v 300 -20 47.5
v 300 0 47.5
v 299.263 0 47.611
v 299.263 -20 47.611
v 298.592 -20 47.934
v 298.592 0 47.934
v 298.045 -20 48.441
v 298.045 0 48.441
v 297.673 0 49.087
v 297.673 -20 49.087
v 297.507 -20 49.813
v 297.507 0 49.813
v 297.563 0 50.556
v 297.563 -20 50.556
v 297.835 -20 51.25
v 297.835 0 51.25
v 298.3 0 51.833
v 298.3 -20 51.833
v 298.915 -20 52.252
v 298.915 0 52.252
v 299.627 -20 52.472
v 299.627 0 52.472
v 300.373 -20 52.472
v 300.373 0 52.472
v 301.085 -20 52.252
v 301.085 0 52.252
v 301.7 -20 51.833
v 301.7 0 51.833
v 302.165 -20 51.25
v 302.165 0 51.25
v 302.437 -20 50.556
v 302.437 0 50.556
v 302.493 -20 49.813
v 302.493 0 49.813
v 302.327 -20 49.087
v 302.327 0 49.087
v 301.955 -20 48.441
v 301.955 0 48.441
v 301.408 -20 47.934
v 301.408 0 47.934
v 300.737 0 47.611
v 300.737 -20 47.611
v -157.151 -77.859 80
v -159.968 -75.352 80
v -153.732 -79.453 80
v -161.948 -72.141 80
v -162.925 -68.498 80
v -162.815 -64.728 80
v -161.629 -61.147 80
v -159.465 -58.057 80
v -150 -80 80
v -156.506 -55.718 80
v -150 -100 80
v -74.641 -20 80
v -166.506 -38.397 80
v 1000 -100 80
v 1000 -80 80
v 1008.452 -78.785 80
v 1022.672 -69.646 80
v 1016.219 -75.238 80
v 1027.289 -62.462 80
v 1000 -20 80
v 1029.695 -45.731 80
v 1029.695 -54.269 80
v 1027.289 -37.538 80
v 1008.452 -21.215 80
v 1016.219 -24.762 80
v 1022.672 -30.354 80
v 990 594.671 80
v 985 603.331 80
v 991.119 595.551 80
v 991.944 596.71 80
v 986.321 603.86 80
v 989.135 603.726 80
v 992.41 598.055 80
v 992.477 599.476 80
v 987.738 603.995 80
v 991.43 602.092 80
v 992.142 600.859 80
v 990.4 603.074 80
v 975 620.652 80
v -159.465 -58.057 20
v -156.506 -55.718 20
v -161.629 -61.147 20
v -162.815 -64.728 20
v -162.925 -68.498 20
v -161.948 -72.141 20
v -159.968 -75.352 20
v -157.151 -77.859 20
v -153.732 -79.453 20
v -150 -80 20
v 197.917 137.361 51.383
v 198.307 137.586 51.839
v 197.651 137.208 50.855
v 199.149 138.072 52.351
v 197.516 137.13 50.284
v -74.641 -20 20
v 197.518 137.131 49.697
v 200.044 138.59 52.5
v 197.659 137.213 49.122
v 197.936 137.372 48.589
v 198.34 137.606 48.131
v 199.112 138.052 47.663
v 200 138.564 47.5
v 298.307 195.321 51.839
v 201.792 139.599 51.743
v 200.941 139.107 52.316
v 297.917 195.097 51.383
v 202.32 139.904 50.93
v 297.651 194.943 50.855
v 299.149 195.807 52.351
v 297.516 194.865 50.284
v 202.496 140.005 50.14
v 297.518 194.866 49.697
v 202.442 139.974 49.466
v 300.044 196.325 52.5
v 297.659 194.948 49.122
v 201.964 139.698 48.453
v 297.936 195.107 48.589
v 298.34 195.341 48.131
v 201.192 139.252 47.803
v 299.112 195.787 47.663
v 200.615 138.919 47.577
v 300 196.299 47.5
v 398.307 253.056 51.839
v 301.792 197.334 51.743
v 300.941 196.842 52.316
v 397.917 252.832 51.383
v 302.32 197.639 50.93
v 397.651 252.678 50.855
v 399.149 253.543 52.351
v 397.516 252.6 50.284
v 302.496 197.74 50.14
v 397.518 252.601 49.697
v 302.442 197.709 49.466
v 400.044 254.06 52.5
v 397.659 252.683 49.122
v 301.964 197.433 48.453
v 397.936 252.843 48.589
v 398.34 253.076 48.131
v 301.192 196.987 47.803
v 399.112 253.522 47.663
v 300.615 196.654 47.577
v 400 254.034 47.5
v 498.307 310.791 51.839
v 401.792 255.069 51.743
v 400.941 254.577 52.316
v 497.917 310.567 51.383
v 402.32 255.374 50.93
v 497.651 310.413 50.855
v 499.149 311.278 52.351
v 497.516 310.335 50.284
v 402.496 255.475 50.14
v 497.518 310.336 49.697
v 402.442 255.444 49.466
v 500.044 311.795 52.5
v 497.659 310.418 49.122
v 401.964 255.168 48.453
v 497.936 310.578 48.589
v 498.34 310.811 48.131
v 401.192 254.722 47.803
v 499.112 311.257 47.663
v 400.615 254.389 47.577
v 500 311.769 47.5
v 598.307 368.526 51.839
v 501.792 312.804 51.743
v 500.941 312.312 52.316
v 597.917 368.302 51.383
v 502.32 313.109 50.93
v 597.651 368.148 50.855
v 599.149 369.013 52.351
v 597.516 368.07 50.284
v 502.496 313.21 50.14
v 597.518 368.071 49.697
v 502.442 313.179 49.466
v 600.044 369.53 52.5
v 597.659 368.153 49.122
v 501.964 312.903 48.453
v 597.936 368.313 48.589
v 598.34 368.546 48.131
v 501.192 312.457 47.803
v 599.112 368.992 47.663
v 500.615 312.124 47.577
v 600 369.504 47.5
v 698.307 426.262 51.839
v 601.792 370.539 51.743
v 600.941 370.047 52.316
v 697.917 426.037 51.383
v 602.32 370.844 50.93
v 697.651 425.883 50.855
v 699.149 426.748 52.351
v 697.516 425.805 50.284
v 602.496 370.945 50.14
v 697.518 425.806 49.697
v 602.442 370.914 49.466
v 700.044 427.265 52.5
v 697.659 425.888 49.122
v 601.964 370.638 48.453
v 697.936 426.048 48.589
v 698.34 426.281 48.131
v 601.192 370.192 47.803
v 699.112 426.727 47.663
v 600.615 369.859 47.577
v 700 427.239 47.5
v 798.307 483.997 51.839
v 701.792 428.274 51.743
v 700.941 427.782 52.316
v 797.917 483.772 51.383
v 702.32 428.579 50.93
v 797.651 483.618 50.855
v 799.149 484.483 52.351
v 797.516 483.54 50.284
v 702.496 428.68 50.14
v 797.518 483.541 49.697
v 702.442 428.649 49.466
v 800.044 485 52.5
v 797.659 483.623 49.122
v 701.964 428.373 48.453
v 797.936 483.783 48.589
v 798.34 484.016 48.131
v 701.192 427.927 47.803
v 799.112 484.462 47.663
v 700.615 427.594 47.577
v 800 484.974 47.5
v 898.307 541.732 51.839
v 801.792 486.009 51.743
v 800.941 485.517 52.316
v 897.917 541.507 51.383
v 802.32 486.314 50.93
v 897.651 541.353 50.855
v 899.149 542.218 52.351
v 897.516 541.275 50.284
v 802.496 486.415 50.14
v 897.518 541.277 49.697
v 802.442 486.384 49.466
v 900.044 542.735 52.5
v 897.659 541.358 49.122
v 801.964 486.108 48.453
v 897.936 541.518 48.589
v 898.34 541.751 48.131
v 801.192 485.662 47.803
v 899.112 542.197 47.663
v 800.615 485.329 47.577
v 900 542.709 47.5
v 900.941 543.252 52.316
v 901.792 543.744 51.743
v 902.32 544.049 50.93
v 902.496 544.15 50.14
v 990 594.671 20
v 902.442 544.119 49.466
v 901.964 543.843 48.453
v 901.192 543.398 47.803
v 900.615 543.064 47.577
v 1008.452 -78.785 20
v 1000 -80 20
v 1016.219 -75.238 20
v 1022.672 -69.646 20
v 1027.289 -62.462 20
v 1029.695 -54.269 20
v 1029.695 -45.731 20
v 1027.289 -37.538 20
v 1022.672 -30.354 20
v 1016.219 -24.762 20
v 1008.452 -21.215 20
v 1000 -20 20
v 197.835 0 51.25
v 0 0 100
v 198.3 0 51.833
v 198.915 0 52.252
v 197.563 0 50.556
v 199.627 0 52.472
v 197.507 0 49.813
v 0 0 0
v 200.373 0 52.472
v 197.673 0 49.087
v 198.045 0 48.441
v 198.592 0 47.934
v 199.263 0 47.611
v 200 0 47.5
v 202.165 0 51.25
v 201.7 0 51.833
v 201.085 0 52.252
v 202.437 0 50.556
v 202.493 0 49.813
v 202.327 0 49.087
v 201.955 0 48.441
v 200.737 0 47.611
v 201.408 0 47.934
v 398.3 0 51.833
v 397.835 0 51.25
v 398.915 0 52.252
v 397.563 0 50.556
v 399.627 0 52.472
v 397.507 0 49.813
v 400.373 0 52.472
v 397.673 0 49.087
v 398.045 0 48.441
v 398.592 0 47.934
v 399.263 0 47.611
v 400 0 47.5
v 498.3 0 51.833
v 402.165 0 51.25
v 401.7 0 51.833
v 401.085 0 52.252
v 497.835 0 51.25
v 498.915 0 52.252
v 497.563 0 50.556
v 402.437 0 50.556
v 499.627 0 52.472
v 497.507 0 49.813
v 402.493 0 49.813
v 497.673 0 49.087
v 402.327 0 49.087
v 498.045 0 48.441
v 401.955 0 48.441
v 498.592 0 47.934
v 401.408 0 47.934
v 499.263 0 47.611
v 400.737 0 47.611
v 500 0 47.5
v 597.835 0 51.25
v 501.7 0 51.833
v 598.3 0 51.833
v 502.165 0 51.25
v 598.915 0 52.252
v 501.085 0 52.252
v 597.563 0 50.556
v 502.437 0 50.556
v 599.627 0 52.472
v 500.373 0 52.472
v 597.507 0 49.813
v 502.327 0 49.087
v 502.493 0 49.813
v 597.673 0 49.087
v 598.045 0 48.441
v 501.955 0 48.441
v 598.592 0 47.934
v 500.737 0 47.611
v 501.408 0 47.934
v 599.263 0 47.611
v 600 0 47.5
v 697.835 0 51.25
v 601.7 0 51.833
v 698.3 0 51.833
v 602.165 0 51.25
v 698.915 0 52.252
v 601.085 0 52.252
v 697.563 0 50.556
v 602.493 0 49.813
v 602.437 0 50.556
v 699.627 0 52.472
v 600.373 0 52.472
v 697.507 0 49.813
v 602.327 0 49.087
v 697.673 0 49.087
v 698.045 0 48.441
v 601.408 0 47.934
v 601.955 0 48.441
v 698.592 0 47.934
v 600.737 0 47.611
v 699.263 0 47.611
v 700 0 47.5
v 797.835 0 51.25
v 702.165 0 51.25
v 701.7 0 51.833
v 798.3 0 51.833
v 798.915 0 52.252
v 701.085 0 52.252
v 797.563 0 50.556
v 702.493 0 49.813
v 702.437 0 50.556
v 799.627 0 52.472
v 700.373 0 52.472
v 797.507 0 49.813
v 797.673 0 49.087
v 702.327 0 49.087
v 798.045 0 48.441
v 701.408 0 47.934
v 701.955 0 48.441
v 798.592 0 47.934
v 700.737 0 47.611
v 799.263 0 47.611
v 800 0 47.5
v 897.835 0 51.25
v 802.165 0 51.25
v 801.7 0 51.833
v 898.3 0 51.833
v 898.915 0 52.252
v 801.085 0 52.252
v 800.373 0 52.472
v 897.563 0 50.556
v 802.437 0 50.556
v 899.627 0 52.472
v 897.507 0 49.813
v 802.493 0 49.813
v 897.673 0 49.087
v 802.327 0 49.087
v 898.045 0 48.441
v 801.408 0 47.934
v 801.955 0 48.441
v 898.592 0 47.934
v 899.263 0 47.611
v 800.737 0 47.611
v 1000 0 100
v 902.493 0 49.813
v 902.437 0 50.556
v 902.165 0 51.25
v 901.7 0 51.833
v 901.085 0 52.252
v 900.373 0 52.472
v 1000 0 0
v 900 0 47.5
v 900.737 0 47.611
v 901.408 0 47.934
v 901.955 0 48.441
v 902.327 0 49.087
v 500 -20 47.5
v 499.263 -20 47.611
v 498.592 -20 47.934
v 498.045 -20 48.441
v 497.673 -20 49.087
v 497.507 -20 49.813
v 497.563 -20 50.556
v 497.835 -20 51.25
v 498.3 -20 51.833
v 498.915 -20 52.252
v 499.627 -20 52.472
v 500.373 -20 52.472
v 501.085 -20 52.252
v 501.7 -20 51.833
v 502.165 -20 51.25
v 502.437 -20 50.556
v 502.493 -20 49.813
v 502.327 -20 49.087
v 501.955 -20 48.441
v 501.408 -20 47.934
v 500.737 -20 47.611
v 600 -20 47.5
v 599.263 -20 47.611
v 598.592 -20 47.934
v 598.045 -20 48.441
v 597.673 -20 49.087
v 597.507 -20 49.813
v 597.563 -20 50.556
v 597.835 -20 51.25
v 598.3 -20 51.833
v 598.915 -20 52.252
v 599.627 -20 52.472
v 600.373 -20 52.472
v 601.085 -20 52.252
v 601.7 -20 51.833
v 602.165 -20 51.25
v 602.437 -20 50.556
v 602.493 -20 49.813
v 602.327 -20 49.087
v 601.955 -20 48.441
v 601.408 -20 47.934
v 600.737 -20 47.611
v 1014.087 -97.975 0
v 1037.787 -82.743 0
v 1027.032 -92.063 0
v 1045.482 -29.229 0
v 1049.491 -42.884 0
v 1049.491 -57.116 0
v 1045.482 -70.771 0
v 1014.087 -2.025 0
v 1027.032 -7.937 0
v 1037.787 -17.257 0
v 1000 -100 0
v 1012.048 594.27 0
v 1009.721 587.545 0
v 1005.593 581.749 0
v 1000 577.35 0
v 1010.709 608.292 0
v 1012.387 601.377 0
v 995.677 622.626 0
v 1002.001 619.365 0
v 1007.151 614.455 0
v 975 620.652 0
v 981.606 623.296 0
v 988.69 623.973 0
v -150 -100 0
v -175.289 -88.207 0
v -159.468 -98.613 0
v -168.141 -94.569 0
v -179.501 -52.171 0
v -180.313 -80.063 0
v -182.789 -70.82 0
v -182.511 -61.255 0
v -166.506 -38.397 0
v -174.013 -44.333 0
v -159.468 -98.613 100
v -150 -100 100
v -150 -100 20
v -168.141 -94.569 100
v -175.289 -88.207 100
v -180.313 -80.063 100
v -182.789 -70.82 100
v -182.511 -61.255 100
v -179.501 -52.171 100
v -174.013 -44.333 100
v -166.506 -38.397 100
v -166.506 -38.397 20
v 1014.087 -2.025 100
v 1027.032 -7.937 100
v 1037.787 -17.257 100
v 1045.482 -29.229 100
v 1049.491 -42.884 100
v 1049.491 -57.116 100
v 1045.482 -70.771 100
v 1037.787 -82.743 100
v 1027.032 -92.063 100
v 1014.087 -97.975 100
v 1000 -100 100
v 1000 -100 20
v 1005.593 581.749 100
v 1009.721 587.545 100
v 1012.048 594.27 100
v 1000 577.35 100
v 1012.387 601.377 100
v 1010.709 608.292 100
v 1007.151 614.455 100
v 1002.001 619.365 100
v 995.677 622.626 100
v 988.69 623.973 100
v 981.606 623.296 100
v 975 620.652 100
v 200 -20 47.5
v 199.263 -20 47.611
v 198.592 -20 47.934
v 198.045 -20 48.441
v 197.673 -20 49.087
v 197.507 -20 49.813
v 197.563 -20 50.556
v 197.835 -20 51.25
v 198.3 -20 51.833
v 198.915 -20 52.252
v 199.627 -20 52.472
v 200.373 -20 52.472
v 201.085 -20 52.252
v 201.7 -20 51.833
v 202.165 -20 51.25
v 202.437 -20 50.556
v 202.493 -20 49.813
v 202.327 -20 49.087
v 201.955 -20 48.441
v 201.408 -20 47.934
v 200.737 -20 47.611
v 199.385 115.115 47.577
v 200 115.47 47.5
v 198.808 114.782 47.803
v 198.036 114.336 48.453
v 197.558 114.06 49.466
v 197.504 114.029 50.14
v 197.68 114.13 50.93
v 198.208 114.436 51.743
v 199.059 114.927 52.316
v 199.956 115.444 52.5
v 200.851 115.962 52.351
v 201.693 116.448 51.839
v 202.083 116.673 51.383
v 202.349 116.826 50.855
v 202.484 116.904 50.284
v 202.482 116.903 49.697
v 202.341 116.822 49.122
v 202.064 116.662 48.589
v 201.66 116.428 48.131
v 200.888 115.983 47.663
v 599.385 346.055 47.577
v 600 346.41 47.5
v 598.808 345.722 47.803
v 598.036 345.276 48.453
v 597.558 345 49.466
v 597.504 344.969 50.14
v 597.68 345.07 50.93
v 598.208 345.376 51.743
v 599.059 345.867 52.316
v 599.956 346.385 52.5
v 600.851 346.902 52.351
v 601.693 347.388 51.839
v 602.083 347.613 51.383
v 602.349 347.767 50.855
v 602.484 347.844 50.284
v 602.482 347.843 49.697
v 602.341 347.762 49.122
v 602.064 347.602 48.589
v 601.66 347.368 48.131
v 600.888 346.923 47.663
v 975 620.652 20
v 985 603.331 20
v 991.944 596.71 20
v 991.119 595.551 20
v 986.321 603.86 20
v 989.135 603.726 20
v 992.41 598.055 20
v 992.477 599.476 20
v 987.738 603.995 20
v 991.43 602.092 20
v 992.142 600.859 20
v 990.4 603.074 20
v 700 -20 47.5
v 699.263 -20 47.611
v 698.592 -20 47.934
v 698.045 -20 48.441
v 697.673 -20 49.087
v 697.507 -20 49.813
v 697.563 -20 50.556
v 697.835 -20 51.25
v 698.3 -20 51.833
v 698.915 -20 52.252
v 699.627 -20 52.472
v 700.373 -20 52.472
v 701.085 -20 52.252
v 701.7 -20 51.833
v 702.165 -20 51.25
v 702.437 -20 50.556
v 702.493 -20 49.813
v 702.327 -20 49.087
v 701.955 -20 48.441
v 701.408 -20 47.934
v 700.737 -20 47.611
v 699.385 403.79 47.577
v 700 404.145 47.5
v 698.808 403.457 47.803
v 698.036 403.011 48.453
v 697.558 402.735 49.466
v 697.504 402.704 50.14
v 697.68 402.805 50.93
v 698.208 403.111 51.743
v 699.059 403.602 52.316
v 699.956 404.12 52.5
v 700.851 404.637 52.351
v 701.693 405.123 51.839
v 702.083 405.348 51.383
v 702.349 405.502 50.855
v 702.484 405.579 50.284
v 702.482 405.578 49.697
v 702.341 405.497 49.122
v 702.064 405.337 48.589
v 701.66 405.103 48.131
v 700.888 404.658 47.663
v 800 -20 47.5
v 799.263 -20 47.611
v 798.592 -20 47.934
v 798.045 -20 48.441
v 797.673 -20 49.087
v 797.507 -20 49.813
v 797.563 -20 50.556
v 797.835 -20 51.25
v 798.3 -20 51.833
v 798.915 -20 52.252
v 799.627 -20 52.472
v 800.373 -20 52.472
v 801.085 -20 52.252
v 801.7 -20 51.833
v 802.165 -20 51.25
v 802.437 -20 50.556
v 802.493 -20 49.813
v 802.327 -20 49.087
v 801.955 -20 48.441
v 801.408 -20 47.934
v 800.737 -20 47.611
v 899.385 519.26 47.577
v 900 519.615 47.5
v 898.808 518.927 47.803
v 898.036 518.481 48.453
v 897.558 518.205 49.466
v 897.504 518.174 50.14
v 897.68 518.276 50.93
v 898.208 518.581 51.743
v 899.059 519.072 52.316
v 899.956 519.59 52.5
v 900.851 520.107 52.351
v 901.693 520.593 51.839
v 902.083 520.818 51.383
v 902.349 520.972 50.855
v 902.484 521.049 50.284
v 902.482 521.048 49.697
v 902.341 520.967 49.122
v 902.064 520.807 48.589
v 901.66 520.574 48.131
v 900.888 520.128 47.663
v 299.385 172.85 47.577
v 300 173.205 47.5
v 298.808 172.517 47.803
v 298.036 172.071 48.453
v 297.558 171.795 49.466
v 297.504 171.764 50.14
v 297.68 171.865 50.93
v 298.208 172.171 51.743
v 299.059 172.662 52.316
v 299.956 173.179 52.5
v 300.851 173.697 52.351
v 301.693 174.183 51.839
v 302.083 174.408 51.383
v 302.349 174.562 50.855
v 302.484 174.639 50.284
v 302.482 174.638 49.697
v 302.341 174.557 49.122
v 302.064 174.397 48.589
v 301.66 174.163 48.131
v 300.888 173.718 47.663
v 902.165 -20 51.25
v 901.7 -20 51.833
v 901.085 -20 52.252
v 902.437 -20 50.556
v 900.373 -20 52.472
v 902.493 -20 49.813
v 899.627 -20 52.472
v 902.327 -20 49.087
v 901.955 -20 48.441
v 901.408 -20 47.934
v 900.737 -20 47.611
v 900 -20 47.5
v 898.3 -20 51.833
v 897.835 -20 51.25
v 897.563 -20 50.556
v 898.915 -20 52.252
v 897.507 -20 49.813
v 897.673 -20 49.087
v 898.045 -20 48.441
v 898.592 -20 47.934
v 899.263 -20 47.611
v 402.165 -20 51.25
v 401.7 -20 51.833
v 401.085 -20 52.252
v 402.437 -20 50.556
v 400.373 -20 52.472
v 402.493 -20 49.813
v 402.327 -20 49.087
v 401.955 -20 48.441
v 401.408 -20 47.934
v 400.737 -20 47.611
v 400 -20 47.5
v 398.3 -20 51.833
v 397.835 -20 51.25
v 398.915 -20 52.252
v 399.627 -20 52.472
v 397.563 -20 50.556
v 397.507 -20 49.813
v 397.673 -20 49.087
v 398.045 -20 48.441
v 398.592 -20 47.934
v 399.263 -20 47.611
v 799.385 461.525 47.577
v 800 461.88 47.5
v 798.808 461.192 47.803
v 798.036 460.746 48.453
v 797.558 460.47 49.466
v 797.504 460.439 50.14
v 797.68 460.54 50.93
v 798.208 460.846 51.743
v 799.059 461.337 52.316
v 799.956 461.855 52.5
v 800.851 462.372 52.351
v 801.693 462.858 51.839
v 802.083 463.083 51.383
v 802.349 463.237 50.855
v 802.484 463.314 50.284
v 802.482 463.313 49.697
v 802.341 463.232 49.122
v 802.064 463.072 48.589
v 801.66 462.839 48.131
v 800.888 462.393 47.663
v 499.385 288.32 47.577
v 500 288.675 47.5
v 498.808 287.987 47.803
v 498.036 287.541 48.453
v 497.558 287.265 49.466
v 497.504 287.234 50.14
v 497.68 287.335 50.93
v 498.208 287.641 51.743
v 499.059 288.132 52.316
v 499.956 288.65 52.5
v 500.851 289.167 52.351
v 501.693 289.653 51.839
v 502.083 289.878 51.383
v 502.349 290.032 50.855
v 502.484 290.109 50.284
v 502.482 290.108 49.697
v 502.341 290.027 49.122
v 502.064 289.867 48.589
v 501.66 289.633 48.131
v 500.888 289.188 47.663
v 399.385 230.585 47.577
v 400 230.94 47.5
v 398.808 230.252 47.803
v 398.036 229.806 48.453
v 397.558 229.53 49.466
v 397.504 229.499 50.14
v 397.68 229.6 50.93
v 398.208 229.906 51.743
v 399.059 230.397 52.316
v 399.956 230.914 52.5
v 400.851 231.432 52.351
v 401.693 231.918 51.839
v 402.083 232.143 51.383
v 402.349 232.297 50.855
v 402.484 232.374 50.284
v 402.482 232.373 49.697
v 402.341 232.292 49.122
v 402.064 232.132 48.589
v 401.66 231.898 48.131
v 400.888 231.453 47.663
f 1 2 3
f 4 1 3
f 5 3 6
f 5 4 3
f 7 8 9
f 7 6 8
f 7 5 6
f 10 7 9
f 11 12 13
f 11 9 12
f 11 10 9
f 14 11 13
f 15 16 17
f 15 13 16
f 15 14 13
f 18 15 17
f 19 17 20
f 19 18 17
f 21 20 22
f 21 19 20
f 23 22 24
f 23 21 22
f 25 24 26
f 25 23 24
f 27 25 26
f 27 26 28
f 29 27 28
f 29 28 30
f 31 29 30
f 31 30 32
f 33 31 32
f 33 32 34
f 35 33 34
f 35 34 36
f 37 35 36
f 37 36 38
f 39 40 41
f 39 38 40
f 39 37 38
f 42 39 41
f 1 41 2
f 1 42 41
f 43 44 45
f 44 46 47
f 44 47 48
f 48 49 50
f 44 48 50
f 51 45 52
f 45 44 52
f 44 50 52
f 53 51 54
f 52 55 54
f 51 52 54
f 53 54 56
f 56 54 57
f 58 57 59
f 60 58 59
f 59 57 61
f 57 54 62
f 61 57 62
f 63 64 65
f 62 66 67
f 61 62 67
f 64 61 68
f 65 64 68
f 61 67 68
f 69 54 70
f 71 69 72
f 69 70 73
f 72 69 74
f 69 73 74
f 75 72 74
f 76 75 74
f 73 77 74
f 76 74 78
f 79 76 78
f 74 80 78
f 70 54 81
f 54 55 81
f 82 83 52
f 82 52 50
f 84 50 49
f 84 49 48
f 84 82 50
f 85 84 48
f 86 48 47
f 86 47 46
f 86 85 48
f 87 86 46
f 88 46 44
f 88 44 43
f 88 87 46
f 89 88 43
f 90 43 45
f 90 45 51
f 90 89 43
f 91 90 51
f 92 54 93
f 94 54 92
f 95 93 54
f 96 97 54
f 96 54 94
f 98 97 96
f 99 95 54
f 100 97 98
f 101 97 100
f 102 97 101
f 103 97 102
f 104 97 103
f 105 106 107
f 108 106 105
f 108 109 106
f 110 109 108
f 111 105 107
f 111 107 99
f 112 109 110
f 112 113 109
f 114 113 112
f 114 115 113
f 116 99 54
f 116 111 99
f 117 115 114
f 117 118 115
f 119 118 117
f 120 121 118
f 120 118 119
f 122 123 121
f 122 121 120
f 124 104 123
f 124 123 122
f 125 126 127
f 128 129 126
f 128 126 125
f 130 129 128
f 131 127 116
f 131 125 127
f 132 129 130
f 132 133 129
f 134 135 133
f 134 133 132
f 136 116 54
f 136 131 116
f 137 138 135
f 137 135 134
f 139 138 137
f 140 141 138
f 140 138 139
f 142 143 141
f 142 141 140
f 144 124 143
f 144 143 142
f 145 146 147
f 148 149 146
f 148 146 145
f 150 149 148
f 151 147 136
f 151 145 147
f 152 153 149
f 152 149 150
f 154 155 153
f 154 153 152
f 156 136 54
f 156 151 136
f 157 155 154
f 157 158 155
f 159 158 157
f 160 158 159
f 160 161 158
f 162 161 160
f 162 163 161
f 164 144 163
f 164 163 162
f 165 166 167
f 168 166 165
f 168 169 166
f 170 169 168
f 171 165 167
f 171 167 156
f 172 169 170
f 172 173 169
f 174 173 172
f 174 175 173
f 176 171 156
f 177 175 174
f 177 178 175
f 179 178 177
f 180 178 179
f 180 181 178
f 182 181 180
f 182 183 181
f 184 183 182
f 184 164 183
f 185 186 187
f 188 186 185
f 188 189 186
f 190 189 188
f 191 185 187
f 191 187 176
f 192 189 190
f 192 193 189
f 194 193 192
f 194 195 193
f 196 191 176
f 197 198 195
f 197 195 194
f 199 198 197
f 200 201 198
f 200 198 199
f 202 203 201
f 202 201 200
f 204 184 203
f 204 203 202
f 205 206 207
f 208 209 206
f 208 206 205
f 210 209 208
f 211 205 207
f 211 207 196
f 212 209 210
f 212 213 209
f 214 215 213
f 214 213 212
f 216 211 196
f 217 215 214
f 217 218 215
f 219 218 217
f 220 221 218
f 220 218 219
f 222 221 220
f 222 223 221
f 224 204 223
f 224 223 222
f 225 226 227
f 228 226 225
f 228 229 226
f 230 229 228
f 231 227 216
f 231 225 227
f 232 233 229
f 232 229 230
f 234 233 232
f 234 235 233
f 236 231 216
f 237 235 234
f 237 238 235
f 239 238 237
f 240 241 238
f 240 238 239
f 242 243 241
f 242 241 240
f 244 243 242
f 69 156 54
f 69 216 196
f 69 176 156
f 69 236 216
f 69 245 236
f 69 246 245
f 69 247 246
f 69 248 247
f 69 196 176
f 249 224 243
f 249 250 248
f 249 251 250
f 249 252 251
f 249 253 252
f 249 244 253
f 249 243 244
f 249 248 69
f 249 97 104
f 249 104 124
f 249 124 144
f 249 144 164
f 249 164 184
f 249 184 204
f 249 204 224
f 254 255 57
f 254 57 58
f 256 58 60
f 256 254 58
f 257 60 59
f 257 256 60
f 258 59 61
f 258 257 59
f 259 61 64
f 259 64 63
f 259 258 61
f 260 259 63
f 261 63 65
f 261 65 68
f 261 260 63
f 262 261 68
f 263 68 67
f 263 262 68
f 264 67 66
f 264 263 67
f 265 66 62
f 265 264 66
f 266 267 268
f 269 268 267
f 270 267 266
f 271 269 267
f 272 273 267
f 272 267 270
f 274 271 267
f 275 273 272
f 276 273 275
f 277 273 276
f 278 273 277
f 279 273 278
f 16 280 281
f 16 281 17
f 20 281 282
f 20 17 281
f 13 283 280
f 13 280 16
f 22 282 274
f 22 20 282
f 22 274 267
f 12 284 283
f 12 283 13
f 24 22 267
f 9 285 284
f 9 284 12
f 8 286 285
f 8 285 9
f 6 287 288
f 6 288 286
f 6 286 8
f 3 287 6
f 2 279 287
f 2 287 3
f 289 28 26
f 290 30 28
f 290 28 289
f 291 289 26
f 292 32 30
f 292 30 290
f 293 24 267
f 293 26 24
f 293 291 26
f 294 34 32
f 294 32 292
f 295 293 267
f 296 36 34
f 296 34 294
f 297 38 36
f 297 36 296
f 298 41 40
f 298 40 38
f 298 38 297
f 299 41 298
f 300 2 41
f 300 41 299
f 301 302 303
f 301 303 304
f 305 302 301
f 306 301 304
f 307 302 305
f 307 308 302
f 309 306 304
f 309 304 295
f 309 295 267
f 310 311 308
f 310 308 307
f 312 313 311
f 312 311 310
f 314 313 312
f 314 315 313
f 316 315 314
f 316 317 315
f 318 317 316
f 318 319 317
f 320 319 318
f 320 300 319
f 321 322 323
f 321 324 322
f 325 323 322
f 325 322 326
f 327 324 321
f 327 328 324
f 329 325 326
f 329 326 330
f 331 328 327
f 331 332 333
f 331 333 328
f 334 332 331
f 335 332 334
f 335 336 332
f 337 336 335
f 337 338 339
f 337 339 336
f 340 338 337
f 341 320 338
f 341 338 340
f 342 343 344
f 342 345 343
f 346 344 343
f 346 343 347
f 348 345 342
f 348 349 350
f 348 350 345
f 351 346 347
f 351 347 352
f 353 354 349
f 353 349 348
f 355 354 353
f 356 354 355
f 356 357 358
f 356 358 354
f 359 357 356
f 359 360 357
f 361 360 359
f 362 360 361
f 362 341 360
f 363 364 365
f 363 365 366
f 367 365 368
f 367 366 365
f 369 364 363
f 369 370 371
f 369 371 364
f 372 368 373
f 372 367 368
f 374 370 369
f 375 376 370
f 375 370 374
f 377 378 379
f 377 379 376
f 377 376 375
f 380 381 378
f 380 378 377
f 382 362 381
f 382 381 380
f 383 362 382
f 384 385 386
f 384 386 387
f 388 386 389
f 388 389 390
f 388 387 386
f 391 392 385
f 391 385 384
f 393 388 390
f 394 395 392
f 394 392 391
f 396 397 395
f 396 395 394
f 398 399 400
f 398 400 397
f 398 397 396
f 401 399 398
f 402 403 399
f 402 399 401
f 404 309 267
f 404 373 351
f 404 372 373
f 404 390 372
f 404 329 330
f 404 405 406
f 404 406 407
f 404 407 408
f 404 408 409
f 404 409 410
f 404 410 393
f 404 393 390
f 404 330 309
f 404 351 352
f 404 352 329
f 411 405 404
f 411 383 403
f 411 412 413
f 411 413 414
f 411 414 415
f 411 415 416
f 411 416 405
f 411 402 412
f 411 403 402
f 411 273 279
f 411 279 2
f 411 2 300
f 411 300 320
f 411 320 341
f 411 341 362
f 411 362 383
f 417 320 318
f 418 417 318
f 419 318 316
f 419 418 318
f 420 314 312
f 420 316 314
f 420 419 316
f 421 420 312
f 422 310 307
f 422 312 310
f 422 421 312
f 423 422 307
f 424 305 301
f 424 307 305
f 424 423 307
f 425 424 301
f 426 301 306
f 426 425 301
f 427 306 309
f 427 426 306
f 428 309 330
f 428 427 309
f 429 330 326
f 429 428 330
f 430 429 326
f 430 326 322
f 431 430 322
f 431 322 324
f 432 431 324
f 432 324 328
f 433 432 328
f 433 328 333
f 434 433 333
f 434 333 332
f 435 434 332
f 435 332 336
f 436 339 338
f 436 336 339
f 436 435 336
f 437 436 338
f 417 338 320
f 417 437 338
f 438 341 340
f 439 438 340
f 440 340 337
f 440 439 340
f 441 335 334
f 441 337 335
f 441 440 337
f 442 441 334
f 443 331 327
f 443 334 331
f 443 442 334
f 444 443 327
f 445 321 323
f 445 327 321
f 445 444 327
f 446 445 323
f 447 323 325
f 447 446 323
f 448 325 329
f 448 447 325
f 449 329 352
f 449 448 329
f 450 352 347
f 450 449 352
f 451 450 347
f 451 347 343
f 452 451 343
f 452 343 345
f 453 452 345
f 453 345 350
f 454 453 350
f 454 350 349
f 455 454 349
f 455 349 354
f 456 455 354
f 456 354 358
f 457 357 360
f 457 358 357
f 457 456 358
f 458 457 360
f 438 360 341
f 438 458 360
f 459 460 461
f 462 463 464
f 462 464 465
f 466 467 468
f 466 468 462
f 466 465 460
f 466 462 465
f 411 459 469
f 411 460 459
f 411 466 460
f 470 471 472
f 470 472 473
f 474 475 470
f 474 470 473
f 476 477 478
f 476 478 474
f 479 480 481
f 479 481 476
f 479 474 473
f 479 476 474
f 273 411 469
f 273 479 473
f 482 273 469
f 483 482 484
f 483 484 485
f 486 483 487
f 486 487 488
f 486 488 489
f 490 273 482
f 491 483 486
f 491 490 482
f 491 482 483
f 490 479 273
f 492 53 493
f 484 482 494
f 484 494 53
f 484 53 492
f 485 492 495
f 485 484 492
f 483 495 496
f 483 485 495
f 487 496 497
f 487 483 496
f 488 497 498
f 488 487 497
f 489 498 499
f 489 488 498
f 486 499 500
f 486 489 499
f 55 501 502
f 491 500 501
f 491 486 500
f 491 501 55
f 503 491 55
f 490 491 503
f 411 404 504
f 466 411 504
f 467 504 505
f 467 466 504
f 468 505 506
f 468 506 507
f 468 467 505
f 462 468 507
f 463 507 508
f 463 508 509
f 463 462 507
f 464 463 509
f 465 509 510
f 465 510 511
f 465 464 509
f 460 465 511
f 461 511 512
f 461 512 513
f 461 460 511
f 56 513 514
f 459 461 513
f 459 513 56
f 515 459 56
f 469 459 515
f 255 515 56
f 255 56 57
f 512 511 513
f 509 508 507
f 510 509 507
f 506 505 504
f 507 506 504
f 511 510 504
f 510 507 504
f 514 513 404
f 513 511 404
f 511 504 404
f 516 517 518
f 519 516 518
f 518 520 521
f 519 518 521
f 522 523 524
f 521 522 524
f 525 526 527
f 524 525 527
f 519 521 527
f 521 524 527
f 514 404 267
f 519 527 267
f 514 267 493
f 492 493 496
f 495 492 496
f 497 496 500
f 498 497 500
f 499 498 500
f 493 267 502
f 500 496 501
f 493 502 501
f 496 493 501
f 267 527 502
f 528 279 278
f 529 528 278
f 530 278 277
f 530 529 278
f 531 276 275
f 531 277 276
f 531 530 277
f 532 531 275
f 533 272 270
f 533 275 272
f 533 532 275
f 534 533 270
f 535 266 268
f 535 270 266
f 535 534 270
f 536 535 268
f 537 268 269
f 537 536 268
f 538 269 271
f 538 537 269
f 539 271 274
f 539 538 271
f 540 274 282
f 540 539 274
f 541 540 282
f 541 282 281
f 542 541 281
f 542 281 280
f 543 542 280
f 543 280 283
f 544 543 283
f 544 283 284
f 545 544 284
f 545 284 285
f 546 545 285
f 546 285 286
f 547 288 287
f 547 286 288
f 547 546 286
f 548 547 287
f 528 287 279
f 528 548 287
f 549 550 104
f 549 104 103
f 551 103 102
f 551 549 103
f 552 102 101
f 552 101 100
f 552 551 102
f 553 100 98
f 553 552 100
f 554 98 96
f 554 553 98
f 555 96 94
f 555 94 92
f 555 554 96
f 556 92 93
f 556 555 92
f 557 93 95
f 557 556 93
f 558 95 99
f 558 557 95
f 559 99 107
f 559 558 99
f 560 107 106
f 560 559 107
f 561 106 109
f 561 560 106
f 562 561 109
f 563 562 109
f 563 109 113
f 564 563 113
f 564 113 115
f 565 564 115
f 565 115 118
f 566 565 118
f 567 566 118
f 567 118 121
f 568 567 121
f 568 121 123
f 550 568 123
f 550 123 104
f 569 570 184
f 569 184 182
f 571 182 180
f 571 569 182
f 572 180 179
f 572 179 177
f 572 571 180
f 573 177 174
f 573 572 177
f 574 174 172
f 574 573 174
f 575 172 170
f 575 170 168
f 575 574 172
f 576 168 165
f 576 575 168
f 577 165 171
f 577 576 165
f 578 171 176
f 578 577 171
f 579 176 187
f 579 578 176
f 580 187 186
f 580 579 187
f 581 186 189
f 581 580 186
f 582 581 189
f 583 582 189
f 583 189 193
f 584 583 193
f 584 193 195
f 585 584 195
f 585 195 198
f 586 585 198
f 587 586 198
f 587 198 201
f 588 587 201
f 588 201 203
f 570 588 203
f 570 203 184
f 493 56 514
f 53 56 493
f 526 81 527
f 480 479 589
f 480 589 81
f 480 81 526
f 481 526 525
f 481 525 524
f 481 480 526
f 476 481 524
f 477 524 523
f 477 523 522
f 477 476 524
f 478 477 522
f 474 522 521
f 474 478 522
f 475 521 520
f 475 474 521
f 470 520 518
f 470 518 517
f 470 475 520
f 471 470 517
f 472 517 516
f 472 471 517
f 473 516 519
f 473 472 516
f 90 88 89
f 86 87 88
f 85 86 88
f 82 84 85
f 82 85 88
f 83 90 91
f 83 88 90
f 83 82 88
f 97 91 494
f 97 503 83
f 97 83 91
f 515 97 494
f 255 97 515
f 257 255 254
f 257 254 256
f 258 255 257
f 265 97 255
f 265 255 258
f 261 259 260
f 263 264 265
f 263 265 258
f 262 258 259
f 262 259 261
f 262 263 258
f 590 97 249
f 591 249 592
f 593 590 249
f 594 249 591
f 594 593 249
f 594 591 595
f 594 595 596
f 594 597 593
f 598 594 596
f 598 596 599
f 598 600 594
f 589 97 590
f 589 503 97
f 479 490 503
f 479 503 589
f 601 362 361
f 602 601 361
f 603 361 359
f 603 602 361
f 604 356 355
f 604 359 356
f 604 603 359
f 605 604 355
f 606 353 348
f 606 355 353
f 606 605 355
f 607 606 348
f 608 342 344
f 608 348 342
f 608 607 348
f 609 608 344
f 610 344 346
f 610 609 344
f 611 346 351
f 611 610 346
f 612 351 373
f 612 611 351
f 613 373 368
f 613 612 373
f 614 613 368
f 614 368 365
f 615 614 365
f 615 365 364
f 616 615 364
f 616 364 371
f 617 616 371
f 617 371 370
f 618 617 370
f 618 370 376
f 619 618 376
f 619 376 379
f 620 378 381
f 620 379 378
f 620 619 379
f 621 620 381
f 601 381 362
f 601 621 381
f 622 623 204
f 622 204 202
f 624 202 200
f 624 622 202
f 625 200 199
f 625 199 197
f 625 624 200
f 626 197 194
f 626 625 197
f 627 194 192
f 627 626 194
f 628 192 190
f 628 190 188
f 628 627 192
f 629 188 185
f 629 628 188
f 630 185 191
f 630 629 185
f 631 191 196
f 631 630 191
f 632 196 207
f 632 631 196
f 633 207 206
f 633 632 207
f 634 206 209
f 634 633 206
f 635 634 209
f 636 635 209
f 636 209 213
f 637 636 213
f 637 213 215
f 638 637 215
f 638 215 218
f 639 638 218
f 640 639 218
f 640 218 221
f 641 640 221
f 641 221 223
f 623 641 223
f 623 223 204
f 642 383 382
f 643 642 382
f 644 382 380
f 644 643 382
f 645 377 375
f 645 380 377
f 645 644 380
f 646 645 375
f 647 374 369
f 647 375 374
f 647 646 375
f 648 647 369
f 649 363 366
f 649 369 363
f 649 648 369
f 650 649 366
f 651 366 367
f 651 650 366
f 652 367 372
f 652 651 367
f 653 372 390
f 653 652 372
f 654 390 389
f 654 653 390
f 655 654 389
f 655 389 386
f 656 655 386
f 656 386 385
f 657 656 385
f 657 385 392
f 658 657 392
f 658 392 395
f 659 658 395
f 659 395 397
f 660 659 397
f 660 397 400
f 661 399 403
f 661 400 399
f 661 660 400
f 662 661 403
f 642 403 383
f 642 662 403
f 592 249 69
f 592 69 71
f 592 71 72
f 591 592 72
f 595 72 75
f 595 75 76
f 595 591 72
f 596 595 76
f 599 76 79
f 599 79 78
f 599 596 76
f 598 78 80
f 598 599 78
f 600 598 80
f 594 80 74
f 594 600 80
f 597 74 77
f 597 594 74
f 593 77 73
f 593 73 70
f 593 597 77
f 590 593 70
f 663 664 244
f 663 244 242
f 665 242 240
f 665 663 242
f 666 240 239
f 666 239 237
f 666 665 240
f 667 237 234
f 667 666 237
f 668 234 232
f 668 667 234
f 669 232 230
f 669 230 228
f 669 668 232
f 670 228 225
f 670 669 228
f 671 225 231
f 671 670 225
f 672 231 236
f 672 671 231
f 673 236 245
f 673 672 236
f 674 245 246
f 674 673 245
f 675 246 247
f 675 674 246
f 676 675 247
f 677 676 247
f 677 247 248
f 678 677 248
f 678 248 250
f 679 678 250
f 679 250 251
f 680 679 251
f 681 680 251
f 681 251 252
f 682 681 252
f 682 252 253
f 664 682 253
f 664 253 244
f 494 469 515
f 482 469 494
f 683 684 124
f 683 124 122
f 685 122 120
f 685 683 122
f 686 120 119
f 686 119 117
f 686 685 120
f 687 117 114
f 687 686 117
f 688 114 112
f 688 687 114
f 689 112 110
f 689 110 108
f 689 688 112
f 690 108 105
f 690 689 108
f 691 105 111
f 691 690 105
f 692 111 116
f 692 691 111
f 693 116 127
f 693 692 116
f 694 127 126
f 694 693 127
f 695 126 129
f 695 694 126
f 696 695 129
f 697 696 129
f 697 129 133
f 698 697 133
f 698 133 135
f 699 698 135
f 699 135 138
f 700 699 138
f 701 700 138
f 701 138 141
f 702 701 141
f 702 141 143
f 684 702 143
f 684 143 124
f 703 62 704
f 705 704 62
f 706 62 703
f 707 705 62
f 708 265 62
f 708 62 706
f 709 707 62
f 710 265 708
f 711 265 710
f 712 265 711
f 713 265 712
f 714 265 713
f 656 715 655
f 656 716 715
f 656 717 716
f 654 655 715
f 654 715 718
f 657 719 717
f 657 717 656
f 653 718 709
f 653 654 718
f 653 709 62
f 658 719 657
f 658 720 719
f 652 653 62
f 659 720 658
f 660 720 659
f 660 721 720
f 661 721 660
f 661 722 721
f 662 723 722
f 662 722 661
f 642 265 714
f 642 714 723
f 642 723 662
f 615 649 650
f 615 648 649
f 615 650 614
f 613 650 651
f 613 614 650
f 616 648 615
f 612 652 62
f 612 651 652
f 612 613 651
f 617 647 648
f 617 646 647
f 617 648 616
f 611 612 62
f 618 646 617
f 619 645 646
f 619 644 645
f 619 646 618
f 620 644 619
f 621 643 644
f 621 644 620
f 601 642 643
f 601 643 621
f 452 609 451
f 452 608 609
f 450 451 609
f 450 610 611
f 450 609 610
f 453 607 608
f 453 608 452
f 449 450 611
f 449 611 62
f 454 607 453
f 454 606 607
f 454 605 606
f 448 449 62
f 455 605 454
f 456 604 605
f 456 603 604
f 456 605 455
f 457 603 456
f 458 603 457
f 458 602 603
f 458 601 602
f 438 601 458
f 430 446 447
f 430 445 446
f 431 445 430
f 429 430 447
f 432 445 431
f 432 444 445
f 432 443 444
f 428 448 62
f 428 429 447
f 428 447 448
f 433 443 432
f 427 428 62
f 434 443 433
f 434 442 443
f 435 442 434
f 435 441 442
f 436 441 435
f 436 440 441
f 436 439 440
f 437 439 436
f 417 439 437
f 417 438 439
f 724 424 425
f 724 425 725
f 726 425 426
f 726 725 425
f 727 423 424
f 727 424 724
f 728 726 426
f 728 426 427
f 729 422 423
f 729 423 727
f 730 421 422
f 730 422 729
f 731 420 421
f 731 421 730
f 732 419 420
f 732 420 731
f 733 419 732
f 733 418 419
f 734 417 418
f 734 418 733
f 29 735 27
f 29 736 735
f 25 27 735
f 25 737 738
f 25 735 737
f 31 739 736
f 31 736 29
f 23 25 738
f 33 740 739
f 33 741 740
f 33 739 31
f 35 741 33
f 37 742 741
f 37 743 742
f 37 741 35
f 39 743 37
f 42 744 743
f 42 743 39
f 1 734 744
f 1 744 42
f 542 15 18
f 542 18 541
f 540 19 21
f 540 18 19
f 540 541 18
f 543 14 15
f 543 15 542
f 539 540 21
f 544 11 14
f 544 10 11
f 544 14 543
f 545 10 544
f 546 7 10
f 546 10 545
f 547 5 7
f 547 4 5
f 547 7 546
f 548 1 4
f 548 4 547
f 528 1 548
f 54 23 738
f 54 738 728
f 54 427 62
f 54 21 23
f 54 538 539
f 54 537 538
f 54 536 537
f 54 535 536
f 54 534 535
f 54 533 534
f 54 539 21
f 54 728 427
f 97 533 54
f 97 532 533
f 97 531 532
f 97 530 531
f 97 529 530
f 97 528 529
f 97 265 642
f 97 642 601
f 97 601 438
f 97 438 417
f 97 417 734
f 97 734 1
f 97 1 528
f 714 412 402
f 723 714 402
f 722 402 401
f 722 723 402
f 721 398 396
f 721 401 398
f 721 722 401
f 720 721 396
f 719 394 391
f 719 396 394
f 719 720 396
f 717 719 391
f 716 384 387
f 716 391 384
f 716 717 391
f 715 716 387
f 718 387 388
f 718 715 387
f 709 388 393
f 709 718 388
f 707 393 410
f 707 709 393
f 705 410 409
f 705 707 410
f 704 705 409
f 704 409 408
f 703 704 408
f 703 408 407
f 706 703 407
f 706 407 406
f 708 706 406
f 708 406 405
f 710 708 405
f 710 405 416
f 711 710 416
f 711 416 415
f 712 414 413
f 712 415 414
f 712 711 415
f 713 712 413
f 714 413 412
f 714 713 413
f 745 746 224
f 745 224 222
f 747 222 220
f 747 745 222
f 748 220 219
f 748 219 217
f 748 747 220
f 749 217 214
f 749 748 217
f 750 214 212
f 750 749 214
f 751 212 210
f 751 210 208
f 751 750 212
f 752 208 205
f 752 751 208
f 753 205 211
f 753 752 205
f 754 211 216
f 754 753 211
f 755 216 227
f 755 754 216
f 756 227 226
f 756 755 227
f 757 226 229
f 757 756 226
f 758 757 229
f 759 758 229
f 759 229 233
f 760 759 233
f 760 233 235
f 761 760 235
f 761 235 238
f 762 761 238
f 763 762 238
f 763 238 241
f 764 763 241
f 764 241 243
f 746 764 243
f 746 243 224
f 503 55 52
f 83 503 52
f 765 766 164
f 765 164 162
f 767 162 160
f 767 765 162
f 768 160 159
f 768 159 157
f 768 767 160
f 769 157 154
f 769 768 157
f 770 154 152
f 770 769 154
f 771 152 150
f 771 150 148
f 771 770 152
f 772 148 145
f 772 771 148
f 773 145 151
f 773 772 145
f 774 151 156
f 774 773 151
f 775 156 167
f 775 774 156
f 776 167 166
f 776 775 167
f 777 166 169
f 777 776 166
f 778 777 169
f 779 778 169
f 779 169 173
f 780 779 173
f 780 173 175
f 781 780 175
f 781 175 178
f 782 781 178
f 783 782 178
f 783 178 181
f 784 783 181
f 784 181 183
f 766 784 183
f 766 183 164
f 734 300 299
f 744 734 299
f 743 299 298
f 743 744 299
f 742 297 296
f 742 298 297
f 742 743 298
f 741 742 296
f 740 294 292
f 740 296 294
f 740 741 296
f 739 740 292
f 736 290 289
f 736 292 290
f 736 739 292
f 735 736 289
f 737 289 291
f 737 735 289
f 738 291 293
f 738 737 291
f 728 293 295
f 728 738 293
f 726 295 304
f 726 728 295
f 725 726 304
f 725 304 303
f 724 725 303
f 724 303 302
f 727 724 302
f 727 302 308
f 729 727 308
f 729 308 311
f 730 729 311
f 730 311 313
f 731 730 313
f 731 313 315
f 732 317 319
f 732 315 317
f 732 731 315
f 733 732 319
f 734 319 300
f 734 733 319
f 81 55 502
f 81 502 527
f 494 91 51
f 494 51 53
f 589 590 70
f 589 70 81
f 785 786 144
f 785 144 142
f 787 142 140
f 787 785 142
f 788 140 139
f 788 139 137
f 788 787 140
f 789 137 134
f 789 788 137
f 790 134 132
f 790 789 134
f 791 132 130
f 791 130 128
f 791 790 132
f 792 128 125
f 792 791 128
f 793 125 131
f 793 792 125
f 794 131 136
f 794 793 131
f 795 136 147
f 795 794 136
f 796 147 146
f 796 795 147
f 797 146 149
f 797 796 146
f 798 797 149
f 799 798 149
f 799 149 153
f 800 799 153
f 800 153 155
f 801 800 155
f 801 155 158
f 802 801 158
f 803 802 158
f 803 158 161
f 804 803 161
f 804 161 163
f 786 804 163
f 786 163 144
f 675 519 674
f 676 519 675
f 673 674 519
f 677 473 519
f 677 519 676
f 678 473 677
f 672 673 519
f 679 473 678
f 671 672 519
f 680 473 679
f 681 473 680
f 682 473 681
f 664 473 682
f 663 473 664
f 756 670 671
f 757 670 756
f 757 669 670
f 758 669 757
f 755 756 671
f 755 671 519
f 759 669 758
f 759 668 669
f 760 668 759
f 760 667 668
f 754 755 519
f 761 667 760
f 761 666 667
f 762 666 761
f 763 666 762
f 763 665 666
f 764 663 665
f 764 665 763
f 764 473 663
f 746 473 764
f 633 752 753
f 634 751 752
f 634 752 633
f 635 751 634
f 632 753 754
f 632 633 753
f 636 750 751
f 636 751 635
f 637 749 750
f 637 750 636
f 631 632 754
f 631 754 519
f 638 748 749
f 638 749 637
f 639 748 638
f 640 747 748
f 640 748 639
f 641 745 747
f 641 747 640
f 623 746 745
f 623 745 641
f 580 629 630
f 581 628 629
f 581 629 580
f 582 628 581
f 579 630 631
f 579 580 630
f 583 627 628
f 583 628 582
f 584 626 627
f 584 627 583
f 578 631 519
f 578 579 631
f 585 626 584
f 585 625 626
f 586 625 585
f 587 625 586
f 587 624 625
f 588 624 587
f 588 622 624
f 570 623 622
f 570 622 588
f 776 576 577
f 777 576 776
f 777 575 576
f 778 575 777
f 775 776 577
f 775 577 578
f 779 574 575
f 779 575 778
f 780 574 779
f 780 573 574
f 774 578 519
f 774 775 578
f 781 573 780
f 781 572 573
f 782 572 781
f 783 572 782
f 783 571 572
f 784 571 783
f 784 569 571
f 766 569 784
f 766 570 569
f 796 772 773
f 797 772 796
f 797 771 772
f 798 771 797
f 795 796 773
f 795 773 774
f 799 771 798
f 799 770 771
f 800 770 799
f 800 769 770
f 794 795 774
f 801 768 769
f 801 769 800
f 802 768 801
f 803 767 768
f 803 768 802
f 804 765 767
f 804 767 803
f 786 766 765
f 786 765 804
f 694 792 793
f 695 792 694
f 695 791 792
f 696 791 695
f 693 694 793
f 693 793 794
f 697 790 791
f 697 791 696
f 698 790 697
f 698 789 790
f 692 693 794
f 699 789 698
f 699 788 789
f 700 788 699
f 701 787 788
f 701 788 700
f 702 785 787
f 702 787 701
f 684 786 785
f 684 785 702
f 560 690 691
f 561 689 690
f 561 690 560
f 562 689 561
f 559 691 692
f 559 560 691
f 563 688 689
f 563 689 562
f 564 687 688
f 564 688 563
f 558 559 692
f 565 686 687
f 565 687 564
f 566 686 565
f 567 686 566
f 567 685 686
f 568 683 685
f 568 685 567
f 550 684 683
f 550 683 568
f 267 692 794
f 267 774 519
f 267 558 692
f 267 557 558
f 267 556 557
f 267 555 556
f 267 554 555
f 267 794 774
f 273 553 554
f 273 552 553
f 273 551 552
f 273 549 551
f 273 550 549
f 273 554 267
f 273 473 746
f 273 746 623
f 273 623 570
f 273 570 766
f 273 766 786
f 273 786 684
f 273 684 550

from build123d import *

# Parameters (mm, degrees)
BOSS_EXTRUDE1_DEPTH     = 100
SHELL1_START            = 20
SHELL1_DEPTH            = 60
CUT_EXTRUDE5_DEPTH      = 700
CUT_EXTRUDE5_DEPTH_BACK = 1226.510966311
SKETCH3_R               = 2.5


# Read off the part's stored shape, not the designer's step: Shell1
with BuildPart() as part:
    # Sketch1 → Boss-Extrude1 (new body)
    with BuildSketch(Plane.XY):
        with BuildLine():
            Line((0, 0), (1000, 0))
            ThreePointArc((1000, 0), (1050, -50), (1000, -100))
            Line((1000, -100), (-150, -100))
            ThreePointArc((-150, -100), (-181.887821353, -75.531614088), (-166.506350946, -38.397459622))
            Line((-166.506350946, -38.397459622), (975, 620.651539379))
            ThreePointArc((975, 620.651539379), (1009.150635095, 611.500904284), (1000, 577.35026919))
            Line((1000, 577.35026919), (0, 0))
        make_face()
    extrude(amount=BOSS_EXTRUDE1_DEPTH)

    # Shell1 outline → Shell1 (cut)
    with BuildSketch(Plane.XY.offset(SHELL1_START)):
        with BuildLine():
            Line((-150, -80), (-150, -100))
            Line((-150, -100), (1000, -100))
            Line((1000, -100), (1000, -80))
            ThreePointArc((1000, -80), (1030, -50), (1000, -20))
            Line((1000, -20), (-74.641016151, -20))
            Line((-74.641016151, -20), (990, 594.670777265))
            ThreePointArc((990, 594.670777265), (991.830127019, 601.500904284), (985, 603.331031303))
            Line((985, 603.331031303), (975, 620.651539379))
            Line((975, 620.651539379), (-166.506350946, -38.397459622))
            Line((-166.506350946, -38.397459622), (-156.506350946, -55.717967697))
            ThreePointArc((-156.506350946, -55.717967697), (-162.569304827, -70.355233185), (-150, -80))
        make_face()
    extrude(amount=SHELL1_DEPTH, mode=Mode.SUBTRACT)

    # Sketch3 → Cut-Extrude5 (cut, two sides: drawn at the far end of the back side and taken through both)
    with BuildSketch(Plane(origin=(0, 0, 0), x_dir=(1, 0, 0), z_dir=(0, 1, 0)).offset(-CUT_EXTRUDE5_DEPTH_BACK)):
        with Locations(Location((200, -50, 0), (0, 0, 90))):
            Circle(SKETCH3_R)
        with Locations(Location((300, -50, 0), (0, 0, 90))):
            Circle(SKETCH3_R)
        with Locations(Location((400, -50, 0), (0, 0, 90))):
            Circle(SKETCH3_R)
        with Locations(Location((500, -50, 0), (0, 0, 90))):
            Circle(SKETCH3_R)
        with Locations(Location((600, -50, 0), (0, 0, 90))):
            Circle(SKETCH3_R)
        with Locations(Location((700, -50, 0), (0, 0, 90))):
            Circle(SKETCH3_R)
        with Locations(Location((800, -50, 0), (0, 0, 90))):
            Circle(SKETCH3_R)
        with Locations(Location((900, -50, 0), (0, 0, 90))):
            Circle(SKETCH3_R)
    extrude(amount=CUT_EXTRUDE5_DEPTH + CUT_EXTRUDE5_DEPTH_BACK, mode=Mode.SUBTRACT)


solid = part.part
